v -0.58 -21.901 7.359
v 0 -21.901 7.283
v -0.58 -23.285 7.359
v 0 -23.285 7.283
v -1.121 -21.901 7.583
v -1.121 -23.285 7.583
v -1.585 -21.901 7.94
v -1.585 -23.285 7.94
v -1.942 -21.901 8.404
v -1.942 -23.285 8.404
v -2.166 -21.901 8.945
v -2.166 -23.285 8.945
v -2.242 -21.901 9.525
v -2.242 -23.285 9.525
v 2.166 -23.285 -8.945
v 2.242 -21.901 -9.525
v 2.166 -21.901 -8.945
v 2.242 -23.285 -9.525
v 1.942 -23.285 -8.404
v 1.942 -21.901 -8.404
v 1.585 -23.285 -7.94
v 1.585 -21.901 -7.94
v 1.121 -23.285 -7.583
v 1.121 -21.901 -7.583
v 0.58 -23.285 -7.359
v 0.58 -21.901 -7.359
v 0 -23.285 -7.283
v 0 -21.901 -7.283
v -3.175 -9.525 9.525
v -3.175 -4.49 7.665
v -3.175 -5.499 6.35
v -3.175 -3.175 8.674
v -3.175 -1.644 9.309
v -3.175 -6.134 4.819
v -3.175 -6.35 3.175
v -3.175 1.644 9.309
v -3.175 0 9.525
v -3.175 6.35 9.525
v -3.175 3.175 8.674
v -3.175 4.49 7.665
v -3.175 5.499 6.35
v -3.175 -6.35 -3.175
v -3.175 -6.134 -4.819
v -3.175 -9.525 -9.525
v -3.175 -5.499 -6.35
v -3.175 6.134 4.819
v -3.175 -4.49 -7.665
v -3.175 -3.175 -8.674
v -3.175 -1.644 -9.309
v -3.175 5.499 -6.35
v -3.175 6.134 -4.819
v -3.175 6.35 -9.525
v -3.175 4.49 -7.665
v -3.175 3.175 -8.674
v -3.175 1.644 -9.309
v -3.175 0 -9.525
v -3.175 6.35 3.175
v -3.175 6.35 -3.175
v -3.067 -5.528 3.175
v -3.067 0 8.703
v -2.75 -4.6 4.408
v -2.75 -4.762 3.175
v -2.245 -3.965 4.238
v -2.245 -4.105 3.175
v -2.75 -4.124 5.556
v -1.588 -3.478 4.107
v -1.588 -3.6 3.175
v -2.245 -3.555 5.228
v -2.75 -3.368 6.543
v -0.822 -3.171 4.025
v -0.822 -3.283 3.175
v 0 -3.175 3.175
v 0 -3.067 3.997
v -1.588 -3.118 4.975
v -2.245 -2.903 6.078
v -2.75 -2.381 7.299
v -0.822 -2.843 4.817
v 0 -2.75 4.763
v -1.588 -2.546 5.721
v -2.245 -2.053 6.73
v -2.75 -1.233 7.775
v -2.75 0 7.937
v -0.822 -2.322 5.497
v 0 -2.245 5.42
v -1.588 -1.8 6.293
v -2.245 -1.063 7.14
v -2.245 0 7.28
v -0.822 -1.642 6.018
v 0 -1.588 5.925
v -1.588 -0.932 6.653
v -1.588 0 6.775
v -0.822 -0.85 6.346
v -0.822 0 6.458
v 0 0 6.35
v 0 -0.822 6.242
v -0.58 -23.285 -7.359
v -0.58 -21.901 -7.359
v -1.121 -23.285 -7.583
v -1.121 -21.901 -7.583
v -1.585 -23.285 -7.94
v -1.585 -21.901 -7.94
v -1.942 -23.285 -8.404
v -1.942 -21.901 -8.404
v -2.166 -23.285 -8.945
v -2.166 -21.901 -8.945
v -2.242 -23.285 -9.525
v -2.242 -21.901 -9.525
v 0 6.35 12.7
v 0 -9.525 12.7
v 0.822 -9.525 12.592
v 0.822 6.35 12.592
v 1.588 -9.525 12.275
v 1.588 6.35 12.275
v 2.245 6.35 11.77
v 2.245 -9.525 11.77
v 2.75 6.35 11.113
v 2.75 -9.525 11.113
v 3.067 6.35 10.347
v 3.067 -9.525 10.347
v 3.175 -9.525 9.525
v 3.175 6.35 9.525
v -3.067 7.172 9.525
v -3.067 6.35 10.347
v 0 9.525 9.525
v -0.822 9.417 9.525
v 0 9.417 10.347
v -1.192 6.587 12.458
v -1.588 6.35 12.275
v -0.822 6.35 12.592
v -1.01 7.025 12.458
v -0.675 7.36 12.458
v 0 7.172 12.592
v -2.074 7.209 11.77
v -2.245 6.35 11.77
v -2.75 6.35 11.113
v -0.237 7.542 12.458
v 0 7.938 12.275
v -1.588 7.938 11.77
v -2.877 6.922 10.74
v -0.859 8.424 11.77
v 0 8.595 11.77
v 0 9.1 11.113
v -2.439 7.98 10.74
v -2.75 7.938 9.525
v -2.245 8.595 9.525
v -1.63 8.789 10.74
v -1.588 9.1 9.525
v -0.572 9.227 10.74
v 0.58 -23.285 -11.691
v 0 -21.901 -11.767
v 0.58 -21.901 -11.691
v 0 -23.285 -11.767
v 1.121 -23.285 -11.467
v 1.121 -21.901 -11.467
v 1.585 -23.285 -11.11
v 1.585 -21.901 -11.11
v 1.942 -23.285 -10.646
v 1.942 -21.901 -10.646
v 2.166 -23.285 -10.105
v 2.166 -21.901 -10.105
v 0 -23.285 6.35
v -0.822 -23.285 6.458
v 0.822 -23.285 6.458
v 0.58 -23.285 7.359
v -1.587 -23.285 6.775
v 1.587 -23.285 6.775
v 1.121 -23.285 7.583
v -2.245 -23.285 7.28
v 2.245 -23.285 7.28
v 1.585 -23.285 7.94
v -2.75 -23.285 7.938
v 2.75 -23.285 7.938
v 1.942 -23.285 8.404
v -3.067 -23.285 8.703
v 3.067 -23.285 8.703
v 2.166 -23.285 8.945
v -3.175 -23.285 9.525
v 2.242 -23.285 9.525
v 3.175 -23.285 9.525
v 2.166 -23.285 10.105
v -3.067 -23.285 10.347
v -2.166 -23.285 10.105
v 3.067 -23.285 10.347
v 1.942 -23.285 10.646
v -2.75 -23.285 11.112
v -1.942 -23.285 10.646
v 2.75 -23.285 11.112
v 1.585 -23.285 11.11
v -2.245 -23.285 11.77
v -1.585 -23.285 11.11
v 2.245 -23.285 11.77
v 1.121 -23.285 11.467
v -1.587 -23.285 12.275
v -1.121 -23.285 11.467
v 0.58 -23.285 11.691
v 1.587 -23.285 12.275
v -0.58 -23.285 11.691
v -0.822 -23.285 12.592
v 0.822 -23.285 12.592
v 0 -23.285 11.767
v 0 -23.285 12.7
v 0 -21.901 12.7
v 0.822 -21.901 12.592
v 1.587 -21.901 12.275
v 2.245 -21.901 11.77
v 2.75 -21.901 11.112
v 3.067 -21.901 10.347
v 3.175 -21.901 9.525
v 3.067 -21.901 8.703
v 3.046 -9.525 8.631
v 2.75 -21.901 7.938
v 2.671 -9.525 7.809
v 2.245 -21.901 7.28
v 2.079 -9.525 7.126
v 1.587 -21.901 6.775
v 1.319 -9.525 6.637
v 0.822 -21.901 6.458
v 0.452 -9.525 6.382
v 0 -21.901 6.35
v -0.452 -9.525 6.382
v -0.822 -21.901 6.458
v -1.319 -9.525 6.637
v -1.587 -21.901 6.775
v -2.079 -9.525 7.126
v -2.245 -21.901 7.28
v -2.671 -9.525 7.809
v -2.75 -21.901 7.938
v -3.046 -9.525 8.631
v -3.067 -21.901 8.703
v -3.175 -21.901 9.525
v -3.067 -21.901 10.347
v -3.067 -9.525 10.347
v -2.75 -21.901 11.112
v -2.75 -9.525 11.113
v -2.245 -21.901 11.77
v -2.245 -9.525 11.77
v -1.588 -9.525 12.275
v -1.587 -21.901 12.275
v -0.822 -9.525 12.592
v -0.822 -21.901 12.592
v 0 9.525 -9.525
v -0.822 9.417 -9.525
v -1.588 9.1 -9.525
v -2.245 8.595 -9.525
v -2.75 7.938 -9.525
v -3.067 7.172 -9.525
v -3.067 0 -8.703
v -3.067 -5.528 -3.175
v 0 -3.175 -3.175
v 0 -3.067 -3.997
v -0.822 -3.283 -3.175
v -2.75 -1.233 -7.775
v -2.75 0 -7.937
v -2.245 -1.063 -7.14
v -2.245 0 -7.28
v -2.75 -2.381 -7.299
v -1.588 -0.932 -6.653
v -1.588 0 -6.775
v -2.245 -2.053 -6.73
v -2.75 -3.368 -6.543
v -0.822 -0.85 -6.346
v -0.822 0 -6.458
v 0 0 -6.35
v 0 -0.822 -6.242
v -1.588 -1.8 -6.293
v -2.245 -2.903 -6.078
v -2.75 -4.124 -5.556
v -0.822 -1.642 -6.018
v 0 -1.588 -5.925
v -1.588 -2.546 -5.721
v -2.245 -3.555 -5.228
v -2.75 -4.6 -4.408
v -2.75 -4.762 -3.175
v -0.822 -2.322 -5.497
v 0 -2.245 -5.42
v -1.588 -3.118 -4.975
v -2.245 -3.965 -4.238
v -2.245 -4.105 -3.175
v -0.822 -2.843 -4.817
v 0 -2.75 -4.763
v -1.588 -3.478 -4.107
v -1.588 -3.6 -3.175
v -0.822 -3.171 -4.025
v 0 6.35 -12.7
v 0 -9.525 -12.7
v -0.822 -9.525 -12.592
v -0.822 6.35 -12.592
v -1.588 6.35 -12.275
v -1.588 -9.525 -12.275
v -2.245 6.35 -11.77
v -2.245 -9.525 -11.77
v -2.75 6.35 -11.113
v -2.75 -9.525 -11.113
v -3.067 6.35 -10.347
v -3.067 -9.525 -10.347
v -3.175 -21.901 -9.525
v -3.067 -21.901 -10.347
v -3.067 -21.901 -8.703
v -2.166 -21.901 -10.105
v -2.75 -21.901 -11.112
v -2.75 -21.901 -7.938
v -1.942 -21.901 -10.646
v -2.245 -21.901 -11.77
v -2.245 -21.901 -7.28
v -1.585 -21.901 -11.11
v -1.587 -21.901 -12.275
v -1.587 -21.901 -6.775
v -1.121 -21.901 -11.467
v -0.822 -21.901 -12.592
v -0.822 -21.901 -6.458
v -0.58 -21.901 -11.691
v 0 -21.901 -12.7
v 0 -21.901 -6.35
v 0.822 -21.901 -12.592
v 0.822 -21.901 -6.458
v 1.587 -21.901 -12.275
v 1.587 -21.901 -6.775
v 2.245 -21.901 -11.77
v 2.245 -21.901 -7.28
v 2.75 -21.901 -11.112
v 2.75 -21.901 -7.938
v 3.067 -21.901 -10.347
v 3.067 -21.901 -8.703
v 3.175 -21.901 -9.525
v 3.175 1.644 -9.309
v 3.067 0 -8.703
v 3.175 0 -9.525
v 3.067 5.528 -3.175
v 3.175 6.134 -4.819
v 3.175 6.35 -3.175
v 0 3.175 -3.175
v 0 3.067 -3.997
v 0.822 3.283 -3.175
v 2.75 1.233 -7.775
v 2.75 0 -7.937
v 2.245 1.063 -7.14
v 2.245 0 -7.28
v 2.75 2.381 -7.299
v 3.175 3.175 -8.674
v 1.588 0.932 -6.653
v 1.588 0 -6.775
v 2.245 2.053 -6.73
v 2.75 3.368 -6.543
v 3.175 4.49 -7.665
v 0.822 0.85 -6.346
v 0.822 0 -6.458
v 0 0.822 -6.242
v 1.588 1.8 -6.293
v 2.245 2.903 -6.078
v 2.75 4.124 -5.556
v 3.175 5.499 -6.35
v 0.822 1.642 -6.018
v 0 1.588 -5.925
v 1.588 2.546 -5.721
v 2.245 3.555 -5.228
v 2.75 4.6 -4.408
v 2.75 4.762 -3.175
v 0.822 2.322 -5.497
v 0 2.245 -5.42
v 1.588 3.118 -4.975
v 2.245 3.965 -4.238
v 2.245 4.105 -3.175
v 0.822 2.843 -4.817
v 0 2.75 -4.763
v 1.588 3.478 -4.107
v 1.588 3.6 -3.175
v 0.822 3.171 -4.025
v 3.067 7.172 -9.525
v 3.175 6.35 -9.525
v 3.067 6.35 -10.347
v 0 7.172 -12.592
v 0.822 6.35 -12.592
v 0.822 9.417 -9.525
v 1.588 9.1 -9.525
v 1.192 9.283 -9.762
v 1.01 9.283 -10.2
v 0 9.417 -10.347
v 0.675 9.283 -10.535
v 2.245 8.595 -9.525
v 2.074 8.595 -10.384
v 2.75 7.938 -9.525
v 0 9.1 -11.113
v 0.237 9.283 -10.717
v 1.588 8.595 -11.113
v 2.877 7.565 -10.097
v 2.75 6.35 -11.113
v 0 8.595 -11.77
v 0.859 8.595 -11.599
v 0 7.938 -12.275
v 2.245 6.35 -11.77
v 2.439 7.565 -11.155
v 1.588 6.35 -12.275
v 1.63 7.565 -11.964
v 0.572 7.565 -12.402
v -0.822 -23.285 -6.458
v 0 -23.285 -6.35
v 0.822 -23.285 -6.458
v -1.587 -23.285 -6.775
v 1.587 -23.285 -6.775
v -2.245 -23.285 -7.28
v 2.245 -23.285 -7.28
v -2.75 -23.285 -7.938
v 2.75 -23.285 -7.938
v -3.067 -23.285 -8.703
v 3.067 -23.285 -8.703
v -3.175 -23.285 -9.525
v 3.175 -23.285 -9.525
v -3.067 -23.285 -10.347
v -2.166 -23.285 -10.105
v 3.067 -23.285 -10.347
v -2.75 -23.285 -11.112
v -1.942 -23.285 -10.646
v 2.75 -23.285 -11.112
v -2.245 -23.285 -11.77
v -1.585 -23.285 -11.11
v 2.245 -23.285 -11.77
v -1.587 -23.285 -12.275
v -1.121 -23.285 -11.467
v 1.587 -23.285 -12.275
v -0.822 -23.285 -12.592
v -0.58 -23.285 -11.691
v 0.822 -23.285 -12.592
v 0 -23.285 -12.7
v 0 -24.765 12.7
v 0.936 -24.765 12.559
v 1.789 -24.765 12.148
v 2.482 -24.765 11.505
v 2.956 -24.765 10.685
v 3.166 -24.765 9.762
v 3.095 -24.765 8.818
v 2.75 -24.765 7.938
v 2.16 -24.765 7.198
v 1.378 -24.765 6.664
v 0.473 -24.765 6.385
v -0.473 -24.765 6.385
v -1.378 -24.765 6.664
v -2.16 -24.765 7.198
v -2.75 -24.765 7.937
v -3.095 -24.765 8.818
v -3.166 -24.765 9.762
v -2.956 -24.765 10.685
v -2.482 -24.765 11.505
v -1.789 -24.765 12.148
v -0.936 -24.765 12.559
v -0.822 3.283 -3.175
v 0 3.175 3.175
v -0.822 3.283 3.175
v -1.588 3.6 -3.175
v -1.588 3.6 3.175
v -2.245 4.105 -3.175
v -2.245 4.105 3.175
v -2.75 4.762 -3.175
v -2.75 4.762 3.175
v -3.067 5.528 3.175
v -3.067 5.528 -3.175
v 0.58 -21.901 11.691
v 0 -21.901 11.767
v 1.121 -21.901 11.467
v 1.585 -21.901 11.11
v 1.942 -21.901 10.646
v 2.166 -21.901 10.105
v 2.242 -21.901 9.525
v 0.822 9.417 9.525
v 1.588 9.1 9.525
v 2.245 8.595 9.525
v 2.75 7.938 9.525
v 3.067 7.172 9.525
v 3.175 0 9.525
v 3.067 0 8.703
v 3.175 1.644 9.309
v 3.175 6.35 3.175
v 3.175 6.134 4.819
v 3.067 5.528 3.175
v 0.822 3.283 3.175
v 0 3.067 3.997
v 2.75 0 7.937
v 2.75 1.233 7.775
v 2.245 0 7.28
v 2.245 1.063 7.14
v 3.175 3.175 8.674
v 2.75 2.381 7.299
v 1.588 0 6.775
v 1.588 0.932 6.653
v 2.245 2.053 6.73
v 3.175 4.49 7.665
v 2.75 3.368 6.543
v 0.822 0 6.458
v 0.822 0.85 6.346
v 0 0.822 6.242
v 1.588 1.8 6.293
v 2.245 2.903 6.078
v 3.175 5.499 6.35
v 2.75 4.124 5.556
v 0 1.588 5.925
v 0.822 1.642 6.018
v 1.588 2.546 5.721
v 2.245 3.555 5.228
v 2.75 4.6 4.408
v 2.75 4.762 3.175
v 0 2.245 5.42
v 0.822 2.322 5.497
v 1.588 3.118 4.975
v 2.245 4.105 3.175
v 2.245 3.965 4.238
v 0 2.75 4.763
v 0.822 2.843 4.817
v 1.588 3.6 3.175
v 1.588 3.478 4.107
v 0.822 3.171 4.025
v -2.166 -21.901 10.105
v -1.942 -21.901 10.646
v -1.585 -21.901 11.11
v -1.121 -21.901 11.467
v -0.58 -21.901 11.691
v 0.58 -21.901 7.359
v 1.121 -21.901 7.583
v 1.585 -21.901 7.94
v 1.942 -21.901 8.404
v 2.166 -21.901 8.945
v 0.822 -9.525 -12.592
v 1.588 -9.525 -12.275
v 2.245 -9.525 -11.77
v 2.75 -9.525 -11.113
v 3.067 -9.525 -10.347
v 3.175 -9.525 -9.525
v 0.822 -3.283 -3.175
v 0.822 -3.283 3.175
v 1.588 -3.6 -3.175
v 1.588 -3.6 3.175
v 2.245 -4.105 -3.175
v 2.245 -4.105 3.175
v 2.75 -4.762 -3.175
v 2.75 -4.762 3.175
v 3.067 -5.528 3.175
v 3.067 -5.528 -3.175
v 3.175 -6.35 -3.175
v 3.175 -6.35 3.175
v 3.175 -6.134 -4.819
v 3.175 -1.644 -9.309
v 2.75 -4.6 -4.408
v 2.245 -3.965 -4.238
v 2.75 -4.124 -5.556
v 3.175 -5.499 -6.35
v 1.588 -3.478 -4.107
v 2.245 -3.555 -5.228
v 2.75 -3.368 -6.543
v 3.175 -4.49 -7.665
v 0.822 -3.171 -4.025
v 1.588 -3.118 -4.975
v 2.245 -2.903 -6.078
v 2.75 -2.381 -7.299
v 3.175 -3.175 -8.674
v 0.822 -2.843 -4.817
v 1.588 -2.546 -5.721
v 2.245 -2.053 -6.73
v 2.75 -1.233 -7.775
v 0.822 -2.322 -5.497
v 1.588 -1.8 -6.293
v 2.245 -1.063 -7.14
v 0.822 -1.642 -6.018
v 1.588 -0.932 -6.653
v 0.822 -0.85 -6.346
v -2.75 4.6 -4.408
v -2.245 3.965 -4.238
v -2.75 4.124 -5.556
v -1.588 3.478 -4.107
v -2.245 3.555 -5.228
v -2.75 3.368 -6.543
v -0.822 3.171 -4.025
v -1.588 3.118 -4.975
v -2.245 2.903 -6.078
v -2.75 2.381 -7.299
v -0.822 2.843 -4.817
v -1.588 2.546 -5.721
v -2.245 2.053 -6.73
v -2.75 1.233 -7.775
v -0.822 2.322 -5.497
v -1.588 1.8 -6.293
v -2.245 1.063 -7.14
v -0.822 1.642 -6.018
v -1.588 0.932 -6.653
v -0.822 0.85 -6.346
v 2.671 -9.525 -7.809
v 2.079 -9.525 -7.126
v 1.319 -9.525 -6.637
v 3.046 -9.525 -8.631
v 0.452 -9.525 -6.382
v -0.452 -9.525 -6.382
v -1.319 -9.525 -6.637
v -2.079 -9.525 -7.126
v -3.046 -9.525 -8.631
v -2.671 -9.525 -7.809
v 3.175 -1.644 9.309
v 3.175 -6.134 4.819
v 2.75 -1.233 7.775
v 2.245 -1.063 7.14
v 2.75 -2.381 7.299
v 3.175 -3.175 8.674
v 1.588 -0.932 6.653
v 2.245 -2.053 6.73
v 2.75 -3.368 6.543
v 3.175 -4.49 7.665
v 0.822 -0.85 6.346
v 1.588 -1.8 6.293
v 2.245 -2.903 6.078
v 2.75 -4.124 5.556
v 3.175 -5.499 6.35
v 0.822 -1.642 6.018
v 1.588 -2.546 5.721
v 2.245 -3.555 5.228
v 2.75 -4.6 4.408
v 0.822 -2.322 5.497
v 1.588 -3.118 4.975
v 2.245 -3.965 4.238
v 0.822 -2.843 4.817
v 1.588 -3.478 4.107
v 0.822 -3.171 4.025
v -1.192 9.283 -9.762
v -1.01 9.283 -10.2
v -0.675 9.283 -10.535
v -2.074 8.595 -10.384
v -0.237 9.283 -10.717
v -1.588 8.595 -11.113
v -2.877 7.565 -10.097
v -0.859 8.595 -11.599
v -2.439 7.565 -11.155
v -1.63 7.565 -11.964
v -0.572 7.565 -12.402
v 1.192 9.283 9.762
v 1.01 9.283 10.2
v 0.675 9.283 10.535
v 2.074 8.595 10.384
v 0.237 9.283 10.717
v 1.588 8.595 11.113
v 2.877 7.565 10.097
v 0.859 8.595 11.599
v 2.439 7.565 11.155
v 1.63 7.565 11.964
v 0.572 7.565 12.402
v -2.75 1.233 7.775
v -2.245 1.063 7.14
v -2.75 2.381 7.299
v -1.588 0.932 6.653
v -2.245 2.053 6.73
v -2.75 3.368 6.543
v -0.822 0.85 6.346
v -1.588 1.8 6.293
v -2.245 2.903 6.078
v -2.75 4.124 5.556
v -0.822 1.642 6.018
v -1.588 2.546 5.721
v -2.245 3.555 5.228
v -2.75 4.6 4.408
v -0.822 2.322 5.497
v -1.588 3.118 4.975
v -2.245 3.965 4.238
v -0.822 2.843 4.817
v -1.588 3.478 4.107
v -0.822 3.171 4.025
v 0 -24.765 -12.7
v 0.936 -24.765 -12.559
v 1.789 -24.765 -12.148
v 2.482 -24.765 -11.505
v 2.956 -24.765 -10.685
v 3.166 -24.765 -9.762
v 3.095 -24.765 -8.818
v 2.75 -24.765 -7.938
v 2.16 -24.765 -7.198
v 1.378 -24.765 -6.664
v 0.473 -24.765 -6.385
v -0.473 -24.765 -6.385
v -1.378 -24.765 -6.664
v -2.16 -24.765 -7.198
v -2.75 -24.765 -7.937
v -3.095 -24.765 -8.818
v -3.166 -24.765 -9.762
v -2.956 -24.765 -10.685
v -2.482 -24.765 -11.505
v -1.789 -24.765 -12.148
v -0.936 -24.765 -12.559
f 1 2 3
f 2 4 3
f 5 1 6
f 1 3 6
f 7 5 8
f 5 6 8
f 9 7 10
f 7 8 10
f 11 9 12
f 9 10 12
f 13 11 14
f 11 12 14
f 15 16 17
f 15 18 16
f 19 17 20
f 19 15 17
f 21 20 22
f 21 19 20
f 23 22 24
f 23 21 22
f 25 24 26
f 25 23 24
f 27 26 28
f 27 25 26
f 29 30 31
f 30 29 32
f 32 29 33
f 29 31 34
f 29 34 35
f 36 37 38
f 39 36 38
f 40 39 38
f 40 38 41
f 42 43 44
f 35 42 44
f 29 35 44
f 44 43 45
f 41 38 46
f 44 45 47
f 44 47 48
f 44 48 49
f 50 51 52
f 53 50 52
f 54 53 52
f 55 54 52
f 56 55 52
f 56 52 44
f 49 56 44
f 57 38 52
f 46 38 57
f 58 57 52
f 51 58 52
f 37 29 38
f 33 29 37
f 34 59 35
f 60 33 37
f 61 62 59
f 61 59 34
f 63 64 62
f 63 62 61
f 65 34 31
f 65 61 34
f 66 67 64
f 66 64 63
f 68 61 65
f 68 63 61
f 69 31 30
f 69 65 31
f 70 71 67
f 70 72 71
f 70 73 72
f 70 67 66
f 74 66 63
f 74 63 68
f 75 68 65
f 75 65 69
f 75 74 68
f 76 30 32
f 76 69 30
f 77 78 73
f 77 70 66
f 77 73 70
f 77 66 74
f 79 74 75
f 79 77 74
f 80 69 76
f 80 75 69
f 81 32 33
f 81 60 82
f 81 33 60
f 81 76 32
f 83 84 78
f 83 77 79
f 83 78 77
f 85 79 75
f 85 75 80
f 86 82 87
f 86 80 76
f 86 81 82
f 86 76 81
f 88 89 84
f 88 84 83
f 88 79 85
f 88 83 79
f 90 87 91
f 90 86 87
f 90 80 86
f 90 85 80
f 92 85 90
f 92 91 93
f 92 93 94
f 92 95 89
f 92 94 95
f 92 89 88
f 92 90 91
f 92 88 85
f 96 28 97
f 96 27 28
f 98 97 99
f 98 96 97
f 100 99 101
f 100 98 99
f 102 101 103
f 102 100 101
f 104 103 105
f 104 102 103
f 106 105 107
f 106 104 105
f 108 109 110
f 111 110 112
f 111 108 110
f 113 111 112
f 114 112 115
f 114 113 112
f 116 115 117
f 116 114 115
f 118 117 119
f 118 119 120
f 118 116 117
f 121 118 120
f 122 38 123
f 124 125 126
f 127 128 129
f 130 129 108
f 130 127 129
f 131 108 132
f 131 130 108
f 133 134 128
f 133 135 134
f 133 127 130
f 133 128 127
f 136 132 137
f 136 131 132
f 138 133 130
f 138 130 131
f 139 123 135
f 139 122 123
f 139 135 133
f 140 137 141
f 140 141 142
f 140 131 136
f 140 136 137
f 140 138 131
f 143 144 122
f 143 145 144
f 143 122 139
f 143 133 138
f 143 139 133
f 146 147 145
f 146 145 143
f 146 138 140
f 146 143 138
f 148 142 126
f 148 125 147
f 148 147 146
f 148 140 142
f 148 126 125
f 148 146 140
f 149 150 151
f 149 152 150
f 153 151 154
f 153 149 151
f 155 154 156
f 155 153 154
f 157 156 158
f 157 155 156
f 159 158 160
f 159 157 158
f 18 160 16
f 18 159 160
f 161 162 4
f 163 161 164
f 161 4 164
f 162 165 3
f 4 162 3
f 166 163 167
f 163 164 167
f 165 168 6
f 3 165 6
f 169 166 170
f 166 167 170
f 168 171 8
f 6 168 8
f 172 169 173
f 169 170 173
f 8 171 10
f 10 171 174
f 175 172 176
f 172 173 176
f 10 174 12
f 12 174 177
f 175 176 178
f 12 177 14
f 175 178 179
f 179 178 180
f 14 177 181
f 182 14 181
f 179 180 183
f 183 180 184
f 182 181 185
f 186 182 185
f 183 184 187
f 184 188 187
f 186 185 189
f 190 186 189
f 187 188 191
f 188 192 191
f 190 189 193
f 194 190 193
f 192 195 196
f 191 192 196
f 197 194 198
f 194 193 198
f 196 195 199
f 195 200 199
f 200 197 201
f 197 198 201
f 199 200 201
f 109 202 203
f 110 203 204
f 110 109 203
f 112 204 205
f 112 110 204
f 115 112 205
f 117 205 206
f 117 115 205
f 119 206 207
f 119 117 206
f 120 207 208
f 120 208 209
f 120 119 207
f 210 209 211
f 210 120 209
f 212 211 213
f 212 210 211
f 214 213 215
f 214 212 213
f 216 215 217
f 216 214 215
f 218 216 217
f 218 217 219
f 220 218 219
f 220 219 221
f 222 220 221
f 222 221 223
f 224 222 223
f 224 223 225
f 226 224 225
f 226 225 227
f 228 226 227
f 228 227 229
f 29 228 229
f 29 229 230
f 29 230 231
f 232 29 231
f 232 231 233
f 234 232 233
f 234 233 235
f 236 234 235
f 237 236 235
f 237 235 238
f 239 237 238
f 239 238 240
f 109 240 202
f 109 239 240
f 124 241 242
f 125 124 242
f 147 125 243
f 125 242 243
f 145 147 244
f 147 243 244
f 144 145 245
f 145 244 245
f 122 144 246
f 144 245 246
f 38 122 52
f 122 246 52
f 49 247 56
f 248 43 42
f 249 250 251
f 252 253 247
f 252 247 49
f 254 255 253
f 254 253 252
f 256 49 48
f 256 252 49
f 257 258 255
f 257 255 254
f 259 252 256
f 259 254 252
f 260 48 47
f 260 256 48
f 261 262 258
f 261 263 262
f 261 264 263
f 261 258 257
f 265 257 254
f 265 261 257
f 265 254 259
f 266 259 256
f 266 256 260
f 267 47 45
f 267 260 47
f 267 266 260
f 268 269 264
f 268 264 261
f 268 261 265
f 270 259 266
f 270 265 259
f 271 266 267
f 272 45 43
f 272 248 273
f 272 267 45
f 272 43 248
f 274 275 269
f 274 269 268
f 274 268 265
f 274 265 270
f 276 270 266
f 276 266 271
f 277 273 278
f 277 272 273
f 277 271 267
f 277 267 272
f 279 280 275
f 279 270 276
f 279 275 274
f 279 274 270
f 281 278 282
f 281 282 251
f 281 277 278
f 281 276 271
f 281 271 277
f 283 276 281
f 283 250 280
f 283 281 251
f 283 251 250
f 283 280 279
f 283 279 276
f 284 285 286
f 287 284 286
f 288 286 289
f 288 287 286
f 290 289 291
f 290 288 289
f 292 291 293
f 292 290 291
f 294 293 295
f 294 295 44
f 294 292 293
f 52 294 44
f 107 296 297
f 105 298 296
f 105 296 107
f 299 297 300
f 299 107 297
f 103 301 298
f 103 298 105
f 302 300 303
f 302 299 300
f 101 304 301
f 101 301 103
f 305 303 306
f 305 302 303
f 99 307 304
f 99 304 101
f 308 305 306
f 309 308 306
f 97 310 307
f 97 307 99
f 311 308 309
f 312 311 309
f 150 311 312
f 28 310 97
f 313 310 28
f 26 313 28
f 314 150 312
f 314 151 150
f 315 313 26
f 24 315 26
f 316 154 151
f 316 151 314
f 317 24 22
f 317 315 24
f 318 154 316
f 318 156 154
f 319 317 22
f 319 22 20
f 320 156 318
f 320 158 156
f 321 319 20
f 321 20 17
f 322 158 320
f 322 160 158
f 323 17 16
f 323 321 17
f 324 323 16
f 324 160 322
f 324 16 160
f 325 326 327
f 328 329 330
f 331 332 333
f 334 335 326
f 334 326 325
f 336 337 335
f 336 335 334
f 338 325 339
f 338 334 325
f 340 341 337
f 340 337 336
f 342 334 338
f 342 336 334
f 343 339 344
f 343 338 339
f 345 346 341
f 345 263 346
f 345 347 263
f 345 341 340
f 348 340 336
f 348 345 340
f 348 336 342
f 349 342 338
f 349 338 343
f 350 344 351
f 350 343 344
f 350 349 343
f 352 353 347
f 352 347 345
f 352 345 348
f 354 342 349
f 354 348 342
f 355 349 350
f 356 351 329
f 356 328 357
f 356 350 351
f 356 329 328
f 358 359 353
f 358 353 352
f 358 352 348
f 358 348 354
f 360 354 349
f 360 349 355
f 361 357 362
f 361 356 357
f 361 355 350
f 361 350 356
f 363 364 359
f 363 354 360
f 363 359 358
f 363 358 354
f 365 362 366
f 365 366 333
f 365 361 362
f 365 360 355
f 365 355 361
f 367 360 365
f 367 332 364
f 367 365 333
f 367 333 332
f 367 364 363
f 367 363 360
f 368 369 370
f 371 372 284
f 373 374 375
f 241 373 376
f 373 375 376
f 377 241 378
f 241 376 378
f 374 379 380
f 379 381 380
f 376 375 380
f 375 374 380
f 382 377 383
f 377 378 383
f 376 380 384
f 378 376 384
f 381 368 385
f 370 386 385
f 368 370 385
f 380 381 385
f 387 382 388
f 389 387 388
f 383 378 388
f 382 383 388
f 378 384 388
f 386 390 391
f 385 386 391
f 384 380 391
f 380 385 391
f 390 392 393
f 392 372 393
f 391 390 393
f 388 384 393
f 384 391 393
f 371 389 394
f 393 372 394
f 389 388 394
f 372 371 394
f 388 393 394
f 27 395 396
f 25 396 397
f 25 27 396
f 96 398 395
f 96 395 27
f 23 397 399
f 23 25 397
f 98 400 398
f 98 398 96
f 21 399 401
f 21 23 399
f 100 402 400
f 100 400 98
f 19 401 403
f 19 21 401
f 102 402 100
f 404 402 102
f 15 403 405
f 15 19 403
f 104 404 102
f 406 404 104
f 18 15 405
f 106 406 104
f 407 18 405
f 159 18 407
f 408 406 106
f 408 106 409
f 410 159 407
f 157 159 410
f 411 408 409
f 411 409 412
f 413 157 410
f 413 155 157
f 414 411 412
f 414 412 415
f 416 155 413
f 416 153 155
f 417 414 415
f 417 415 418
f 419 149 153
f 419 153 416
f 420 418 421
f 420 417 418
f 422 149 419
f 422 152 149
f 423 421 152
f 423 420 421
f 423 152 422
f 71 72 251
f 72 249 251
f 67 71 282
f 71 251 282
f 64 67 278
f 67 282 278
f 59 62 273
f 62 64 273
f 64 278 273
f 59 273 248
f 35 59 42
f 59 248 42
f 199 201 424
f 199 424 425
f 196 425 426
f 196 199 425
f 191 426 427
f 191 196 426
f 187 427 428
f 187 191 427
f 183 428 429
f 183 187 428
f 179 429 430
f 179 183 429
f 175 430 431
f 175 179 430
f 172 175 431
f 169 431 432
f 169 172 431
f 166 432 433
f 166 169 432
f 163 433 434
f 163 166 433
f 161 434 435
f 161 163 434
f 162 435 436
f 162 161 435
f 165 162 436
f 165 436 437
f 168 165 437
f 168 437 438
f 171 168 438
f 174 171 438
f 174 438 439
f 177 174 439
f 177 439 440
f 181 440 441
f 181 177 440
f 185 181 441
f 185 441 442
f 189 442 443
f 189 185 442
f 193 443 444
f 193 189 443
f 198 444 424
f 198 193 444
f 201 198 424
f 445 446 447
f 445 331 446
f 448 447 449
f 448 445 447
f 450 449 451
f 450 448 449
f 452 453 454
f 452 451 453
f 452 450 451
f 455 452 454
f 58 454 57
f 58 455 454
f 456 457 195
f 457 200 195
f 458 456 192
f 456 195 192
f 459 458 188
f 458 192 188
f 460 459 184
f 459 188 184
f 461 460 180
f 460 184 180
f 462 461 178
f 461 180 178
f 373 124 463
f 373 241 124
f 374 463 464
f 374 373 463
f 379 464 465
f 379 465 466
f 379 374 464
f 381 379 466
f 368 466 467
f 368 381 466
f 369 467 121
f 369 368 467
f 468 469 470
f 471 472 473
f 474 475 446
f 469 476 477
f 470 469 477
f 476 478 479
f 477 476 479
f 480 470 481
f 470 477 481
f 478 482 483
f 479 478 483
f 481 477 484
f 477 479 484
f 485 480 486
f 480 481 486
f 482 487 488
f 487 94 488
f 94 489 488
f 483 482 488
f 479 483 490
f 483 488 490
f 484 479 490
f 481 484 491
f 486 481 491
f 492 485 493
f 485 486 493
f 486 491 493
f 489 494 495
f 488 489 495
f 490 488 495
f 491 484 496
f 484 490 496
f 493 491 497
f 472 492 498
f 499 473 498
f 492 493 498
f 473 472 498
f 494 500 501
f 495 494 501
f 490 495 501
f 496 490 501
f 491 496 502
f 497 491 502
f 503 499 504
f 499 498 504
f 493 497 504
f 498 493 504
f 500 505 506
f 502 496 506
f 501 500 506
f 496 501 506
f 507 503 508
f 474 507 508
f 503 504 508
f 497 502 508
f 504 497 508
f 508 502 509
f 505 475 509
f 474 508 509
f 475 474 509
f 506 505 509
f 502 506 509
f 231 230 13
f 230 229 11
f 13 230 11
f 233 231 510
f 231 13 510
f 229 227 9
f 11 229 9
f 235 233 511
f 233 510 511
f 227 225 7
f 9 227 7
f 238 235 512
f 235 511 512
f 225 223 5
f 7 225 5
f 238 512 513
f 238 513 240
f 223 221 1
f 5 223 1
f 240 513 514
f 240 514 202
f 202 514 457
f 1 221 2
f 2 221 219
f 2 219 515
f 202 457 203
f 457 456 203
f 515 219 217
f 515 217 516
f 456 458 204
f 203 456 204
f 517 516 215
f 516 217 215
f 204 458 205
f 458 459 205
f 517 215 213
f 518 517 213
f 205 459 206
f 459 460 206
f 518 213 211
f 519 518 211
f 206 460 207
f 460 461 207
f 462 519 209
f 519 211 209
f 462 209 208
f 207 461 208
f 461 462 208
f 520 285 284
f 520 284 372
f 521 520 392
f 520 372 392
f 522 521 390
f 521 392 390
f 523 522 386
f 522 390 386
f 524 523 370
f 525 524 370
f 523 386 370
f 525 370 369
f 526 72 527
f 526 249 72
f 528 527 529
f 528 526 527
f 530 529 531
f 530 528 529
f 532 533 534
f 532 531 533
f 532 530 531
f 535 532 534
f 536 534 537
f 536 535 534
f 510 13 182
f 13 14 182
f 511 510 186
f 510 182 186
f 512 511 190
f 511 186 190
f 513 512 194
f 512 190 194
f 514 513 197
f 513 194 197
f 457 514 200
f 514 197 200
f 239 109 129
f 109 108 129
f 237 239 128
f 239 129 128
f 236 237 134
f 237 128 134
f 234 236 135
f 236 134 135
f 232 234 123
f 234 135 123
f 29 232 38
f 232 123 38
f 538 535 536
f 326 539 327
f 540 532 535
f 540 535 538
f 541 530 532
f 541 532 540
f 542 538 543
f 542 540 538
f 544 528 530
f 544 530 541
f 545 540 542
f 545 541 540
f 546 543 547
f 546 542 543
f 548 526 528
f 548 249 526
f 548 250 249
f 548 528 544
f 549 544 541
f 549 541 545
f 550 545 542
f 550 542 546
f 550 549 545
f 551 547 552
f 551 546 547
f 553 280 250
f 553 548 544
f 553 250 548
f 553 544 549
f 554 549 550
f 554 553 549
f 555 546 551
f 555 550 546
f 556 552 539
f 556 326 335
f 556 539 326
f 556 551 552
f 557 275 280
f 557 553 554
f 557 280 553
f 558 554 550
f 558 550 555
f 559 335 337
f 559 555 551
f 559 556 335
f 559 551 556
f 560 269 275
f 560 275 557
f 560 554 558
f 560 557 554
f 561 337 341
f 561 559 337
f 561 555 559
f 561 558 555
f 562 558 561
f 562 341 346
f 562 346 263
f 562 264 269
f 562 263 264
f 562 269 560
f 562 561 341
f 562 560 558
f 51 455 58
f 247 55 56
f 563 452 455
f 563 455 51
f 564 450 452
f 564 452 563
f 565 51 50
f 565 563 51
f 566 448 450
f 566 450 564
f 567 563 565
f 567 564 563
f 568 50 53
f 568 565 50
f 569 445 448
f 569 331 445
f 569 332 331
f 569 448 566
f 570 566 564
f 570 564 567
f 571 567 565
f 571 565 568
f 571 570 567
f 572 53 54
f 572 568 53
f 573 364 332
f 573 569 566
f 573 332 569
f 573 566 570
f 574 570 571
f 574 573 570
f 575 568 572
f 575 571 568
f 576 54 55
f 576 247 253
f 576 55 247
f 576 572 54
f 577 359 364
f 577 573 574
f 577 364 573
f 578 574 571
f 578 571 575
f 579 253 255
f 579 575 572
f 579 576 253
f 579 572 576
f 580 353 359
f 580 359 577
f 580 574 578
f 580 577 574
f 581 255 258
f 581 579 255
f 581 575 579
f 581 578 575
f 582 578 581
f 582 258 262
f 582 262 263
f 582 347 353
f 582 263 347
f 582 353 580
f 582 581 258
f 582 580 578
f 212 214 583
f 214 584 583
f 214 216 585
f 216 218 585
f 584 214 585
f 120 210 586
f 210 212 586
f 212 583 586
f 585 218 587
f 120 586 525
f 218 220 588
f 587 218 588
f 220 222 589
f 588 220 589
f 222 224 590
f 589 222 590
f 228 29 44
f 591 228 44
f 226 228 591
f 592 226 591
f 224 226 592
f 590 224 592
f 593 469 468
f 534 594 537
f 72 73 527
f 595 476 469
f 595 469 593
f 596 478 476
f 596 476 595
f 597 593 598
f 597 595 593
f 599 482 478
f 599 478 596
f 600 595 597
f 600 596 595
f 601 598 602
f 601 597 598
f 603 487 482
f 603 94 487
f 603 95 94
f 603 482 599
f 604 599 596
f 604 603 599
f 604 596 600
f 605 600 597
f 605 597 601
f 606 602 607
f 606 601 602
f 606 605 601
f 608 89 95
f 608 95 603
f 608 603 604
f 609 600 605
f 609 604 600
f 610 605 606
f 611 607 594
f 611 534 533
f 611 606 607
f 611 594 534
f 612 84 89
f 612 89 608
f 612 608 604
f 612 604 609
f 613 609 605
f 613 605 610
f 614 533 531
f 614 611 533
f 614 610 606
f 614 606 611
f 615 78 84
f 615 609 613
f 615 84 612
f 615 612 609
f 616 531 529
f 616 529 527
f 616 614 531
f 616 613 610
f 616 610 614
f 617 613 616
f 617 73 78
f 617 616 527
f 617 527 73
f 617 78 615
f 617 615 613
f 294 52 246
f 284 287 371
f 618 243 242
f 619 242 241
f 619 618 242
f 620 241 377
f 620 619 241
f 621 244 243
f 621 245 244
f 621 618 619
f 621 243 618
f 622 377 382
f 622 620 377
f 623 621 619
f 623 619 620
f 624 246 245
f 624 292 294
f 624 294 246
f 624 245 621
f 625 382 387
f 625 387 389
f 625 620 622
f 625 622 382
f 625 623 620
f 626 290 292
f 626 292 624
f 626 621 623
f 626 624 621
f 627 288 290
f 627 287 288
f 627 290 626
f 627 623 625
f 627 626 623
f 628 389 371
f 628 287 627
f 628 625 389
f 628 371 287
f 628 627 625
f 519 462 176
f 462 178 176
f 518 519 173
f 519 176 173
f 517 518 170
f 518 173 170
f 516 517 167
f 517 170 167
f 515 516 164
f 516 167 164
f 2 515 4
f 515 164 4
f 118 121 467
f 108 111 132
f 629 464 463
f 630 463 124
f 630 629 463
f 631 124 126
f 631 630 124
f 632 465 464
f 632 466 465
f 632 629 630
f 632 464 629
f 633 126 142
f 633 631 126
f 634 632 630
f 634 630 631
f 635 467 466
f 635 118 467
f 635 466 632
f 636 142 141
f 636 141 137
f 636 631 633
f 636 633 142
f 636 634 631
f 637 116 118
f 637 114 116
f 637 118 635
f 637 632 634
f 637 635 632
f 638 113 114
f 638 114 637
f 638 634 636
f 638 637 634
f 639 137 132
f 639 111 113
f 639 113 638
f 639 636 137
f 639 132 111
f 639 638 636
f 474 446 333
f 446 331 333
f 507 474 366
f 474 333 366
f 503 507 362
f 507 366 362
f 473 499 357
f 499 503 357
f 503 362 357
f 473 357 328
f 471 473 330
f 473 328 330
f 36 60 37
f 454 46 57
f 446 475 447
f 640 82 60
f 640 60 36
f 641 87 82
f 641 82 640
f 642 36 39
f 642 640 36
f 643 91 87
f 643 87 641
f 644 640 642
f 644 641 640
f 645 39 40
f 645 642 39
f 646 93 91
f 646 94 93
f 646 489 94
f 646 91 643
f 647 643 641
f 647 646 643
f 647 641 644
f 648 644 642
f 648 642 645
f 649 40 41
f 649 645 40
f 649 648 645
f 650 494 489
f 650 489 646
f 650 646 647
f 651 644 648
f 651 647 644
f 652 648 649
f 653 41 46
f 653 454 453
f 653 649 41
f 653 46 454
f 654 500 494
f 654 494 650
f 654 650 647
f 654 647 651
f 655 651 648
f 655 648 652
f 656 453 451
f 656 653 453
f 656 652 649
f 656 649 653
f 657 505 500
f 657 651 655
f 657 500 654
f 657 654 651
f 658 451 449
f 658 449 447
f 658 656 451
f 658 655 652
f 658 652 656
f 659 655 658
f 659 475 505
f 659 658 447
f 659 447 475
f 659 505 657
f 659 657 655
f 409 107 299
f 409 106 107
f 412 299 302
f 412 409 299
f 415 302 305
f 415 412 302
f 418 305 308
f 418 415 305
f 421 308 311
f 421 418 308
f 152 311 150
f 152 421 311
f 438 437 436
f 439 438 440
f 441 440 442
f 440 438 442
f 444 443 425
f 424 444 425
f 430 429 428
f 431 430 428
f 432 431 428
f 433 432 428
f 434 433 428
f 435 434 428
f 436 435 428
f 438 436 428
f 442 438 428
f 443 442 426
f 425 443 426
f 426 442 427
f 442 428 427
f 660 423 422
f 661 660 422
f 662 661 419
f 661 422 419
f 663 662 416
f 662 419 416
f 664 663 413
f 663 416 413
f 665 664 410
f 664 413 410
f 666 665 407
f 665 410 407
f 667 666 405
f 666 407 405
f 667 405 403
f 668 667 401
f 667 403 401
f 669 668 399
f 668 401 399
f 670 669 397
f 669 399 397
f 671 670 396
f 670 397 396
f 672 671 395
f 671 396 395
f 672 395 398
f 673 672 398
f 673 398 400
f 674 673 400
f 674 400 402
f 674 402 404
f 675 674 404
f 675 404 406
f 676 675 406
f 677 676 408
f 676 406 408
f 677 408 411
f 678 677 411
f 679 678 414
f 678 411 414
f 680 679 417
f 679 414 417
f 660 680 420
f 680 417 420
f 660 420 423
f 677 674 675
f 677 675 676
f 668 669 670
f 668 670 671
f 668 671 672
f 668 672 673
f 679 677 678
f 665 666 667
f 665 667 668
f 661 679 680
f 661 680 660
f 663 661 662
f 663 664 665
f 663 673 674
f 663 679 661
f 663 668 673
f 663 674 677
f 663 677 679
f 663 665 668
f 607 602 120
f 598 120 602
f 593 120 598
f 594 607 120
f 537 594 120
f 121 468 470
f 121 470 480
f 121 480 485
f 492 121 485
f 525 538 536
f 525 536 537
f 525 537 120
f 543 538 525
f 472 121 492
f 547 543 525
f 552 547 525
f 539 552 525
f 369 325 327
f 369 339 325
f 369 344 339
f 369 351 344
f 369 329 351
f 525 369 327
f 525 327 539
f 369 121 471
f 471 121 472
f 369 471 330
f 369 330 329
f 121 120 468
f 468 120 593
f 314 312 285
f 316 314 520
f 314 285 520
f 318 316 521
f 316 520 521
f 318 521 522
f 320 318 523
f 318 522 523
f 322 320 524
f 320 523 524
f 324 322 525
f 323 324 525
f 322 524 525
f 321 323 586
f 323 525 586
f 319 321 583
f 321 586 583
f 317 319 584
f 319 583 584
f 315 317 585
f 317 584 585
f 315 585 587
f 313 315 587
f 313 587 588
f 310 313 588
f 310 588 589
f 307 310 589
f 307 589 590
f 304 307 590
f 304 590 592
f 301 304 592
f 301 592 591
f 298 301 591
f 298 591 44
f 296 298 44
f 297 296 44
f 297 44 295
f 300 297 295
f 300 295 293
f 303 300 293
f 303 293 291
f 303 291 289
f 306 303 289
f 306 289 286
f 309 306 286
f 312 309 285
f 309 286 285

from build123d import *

# Parameters (mm, degrees)
BOSS_EXTRUDE1_DEPTH      = 3.175
BOSS_EXTRUDE1_DEPTH_BACK = 3.175
SKETCH1_W                = 25.4
SKETCH1_H                = 19.05
SKETCH1_W_2              = 12.7
SKETCH1_H_2              = 6.35
FILLET1_R                = 3.175
SKETCH3_R                = 3.175
BOSS_EXTRUDE2_DEPTH      = 15.24
SKETCH6_W                = 0.932989676
SKETCH6_H                = 1.384301363


with BuildPart() as part:
    # Sketch1 → Boss-Extrude1 (new, two sides: drawn at the far end of the back side and taken through both)
    with BuildSketch(Plane(origin=(0, 0, 0), x_dir=(0, 0, -1), z_dir=(1, 0, 0)).offset(-BOSS_EXTRUDE1_DEPTH_BACK)):
        Rectangle(SKETCH1_W, SKETCH1_H)
        Rectangle(SKETCH1_W_2, SKETCH1_H_2, mode=Mode.SUBTRACT)
    extrude(amount=BOSS_EXTRUDE1_DEPTH + BOSS_EXTRUDE1_DEPTH_BACK)

    # Fillet1
    fillet1_edges = [part.edges().sort_by_distance(p)[0] for p in [
        (-3.175, 0, -12.7),
        (-3.175, 9.525, 0),
        (-3.175, 0, 6.35),
        (0, -3.175, 6.35),
        (-3.175, 3.175, 0),
        (0, 3.175, 6.35),
        (-3.175, 0, -6.35),
        (0, 3.175, -6.35),
        (-3.175, -3.175, 0),
        (0, -3.175, -6.35),
        (3.175, 0, 12.7),
        (3.175, 0, -12.7),
        (3.175, 9.525, 0),
        (3.175, 0, 6.35),
        (3.175, -3.175, 0),
        (3.175, 0, -6.35),
        (3.175, 3.175, 0),
        (-3.175, 0, 12.7),
        (0, 9.525, 12.7),
        (0, 9.525, -12.7),
    ]]
    fillet(fillet1_edges, radius=FILLET1_R - 0.0001)  # a hair under: the kernel refuses the full size

    # Sketch3 → Boss-Extrude2 (add)
    with BuildSketch(Plane.XZ.offset(9.525)):
        with Locations(Location((0, -9.525, 0), (0, 0, 270))):
            Circle(SKETCH3_R)
    boss_extrude2 = extrude(amount=BOSS_EXTRUDE2_DEPTH)

    # Cut-Sweep1: sweep along a curve in space
    with BuildLine() as cut_sweep1_path:
        ThreePointArc((0, -24.765, -12.7), (2.24506403, -24.765, -11.77006403), (3.175, -24.765, -9.525))
        ThreePointArc((3.175, -24.765, -9.525), (2.24506403, -24.765, -7.27993597), (0, -24.765, -6.35))
        ThreePointArc((0, -24.765, -6.35), (-2.24506403, -24.765, -7.27993597), (-3.175, -24.765, -9.525))
        ThreePointArc((-3.175, -24.765, -9.525), (-2.24506403, -24.765, -11.77006403), (0, -24.765, -12.7))
    # Sketch6 → Cut-Sweep1 (sweep, cut)
    with BuildSketch(Plane(origin=(0, 0, 0), x_dir=(0, 0, -1), z_dir=(1, 0, 0))):
        with Locations((12.233505162, -22.592816152)):
            Rectangle(SKETCH6_W, SKETCH6_H)
    cut_sweep1 = sweep(path=cut_sweep1_path.line, mode=Mode.SUBTRACT)

    # Mirror1: Boss-Extrude2, Cut-Sweep1 across plane
    add(boss_extrude2.mirror(Plane.XY))
    add(cut_sweep1.mirror(Plane.XY), mode=Mode.SUBTRACT)


solid = part.part
